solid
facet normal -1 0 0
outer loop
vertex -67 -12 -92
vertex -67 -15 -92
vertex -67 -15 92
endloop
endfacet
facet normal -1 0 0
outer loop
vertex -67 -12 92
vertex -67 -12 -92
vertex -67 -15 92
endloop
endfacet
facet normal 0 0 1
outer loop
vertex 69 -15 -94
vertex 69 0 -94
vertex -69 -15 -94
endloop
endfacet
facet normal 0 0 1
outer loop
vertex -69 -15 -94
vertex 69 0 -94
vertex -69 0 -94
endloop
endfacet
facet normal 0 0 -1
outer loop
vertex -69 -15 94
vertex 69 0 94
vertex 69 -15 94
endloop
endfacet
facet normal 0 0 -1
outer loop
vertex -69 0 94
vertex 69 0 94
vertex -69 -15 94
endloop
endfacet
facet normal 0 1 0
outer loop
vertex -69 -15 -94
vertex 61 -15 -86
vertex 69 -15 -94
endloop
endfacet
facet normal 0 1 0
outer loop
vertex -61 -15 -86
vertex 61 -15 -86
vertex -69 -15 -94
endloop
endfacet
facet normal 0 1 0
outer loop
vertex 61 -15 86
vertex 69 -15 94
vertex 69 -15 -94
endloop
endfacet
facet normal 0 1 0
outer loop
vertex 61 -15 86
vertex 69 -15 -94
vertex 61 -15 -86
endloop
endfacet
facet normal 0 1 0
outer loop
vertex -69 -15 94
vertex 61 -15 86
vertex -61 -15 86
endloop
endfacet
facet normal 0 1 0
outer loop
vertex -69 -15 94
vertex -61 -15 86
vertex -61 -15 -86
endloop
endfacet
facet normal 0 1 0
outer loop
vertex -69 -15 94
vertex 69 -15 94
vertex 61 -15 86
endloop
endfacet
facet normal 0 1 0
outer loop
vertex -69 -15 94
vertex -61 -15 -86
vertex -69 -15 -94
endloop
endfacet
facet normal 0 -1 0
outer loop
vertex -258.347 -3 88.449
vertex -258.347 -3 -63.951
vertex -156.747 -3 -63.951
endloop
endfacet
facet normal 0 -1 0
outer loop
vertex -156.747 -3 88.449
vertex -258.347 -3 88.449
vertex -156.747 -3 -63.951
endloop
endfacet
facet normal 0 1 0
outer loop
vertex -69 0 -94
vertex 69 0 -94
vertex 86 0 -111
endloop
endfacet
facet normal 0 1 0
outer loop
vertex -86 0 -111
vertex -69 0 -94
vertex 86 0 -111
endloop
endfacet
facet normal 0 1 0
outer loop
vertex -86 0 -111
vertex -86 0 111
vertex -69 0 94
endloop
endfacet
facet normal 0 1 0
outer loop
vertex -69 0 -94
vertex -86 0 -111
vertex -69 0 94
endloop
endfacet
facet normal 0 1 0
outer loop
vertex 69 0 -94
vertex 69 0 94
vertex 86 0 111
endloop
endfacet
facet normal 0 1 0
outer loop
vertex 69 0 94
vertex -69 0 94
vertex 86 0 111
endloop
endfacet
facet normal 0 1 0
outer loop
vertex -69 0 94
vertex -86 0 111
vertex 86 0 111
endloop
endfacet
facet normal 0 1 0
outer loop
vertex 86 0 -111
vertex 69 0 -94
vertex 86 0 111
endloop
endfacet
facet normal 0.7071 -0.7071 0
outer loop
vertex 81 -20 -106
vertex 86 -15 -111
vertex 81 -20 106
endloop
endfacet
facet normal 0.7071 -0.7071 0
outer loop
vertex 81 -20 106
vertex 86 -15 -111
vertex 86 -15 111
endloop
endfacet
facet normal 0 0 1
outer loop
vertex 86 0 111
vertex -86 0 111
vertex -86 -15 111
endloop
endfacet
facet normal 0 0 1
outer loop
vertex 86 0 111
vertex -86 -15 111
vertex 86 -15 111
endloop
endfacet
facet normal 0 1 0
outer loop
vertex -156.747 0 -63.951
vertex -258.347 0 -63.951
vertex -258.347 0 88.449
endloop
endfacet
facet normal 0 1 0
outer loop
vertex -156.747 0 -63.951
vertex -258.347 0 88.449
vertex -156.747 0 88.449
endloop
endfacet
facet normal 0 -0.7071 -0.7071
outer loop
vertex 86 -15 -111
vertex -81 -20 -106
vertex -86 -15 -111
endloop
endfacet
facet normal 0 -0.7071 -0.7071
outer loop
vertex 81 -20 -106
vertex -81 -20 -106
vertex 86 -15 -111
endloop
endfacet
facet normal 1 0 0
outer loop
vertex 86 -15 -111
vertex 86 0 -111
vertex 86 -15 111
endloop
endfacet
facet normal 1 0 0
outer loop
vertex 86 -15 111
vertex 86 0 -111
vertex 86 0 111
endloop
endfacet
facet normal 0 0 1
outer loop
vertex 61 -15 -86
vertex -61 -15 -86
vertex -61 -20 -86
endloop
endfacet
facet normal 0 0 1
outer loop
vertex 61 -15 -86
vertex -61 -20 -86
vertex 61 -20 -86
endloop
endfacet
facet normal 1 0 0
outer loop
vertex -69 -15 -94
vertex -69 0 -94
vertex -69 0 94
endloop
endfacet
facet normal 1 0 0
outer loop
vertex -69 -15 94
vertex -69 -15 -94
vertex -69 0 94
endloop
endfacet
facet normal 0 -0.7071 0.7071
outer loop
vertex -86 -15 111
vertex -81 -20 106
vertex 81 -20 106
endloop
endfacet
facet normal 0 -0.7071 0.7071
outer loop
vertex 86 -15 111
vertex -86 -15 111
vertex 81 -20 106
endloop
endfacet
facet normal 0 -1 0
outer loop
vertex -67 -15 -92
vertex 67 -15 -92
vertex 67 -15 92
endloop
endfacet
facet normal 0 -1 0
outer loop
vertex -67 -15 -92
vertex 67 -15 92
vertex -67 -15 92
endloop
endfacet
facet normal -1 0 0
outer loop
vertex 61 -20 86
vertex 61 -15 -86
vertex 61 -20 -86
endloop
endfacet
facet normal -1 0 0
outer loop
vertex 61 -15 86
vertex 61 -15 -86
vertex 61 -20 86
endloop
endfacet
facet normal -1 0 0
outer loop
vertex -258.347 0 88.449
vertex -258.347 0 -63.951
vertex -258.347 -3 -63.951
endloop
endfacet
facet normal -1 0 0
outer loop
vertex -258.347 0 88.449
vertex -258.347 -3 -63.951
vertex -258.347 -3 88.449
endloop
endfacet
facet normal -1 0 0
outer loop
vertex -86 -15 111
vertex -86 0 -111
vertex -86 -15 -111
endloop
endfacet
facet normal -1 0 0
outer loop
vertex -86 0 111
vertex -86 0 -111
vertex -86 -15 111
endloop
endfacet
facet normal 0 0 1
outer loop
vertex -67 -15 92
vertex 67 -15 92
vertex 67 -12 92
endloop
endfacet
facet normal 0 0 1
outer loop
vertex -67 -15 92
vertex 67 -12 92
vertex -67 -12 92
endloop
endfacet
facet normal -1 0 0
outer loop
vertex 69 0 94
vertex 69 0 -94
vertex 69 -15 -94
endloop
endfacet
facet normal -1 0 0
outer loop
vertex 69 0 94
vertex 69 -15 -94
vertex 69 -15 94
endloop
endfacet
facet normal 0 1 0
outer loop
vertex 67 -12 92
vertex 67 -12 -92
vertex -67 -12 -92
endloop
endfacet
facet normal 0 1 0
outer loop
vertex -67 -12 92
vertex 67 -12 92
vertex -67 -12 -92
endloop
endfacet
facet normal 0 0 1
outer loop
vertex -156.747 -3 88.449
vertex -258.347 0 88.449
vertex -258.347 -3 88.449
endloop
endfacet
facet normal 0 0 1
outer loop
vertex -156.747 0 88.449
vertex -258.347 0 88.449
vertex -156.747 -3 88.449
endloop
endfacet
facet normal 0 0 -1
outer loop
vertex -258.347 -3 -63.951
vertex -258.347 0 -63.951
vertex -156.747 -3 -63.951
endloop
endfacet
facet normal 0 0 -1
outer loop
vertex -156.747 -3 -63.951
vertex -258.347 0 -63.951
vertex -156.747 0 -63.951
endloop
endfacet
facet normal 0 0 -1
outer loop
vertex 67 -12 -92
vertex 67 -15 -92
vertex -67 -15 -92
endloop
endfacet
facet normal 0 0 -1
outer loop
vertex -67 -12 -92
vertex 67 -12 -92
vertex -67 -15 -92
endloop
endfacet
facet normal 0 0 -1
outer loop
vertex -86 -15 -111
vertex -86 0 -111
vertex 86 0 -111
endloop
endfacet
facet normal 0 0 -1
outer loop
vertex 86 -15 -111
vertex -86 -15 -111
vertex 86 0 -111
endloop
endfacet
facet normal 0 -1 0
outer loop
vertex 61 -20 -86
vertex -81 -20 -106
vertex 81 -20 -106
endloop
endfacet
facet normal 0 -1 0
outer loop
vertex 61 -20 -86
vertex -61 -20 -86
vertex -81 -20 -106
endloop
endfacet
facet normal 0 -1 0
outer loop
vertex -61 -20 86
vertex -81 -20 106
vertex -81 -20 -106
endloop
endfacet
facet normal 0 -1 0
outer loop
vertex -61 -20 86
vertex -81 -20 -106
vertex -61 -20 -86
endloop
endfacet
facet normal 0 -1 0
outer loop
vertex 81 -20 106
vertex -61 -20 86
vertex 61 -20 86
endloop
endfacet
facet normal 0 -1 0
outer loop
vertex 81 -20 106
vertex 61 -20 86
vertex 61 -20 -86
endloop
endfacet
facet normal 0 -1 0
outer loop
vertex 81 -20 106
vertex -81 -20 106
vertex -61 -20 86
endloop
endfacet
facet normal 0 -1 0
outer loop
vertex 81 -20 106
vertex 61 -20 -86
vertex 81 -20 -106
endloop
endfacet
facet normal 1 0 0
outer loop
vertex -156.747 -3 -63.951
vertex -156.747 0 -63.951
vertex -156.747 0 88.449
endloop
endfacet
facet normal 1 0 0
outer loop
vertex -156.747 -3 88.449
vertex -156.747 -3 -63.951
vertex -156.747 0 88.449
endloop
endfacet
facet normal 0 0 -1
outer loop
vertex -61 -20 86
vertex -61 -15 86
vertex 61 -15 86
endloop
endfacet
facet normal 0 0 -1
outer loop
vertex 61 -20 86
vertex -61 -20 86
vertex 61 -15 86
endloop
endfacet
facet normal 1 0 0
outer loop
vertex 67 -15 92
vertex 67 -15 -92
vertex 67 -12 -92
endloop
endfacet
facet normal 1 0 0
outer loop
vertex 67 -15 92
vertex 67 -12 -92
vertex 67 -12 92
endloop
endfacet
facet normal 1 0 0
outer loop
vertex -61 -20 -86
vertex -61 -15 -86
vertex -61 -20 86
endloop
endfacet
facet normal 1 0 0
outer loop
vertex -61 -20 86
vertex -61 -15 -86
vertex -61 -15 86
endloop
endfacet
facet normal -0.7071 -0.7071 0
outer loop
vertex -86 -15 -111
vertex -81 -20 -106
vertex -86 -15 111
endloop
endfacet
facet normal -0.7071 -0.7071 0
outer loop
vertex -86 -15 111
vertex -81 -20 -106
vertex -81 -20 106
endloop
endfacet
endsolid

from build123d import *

# Parameters (mm, degrees)
F0_W     = 172
F0_H     = 222
F0_W_2   = 122
F0_H_2   = 172
F1_DEPTH = 20
F2_W     = 138
F2_H     = 188
F2_W_2   = 122
F2_H_2   = 172
F3_DEPTH = 15
F4_SIZE  = 5
F5_W     = 101.6
F5_H     = 152.4
F6_DEPTH = 3
F8_W     = 134
F8_H     = 184
F9_DEPTH = 3


# Not quite as in the source:
# - a feature names something its author has since deleted; it is built from what else it names


with BuildPart() as f1:
    # F0 (on Front) → F1 (new body)
    with BuildSketch(Plane.XZ):
        Rectangle(F0_W, F0_H)
        Rectangle(F0_W_2, F0_H_2, mode=Mode.SUBTRACT)
    extrude(amount=F1_DEPTH)

    # F2 (on face) → F3 (cut)
    with BuildSketch(Plane(origin=(0, 0, 0), x_dir=(-1, 0, 0), z_dir=(0, 1, 0))):
        Rectangle(F2_W, F2_H)
        Rectangle(F2_W_2, F2_H_2, mode=Mode.SUBTRACT)
    extrude(amount=-F3_DEPTH, mode=Mode.SUBTRACT)

    # F4
    f4_edges = [f1.edges().sort_by_distance(p)[0] for p in [
        (-86, -20, 0),
        (0, -20, 111),
        (86, -20, 0),
        (0, -20, -111),
    ]]
    chamfer(f4_edges, length=F4_SIZE)


with BuildPart() as f6:
    # F5 (on Front) → F6 (new body)
    with BuildSketch(Plane.XZ):
        with Locations((-207.5474485755, 12.2491330458)):
            Rectangle(F5_W, F5_H)
    extrude(amount=F6_DEPTH)


with BuildPart() as f9:
    # F8 (on face) → F9 (new body)
    with BuildSketch(Plane(origin=(0, -15, 0), x_dir=(-1, 0, 0), z_dir=(0, 1, 0))):
        Rectangle(F8_W, F8_H)
    extrude(amount=F9_DEPTH)


solid = Compound([f1.part, f6.part, f9.part])
